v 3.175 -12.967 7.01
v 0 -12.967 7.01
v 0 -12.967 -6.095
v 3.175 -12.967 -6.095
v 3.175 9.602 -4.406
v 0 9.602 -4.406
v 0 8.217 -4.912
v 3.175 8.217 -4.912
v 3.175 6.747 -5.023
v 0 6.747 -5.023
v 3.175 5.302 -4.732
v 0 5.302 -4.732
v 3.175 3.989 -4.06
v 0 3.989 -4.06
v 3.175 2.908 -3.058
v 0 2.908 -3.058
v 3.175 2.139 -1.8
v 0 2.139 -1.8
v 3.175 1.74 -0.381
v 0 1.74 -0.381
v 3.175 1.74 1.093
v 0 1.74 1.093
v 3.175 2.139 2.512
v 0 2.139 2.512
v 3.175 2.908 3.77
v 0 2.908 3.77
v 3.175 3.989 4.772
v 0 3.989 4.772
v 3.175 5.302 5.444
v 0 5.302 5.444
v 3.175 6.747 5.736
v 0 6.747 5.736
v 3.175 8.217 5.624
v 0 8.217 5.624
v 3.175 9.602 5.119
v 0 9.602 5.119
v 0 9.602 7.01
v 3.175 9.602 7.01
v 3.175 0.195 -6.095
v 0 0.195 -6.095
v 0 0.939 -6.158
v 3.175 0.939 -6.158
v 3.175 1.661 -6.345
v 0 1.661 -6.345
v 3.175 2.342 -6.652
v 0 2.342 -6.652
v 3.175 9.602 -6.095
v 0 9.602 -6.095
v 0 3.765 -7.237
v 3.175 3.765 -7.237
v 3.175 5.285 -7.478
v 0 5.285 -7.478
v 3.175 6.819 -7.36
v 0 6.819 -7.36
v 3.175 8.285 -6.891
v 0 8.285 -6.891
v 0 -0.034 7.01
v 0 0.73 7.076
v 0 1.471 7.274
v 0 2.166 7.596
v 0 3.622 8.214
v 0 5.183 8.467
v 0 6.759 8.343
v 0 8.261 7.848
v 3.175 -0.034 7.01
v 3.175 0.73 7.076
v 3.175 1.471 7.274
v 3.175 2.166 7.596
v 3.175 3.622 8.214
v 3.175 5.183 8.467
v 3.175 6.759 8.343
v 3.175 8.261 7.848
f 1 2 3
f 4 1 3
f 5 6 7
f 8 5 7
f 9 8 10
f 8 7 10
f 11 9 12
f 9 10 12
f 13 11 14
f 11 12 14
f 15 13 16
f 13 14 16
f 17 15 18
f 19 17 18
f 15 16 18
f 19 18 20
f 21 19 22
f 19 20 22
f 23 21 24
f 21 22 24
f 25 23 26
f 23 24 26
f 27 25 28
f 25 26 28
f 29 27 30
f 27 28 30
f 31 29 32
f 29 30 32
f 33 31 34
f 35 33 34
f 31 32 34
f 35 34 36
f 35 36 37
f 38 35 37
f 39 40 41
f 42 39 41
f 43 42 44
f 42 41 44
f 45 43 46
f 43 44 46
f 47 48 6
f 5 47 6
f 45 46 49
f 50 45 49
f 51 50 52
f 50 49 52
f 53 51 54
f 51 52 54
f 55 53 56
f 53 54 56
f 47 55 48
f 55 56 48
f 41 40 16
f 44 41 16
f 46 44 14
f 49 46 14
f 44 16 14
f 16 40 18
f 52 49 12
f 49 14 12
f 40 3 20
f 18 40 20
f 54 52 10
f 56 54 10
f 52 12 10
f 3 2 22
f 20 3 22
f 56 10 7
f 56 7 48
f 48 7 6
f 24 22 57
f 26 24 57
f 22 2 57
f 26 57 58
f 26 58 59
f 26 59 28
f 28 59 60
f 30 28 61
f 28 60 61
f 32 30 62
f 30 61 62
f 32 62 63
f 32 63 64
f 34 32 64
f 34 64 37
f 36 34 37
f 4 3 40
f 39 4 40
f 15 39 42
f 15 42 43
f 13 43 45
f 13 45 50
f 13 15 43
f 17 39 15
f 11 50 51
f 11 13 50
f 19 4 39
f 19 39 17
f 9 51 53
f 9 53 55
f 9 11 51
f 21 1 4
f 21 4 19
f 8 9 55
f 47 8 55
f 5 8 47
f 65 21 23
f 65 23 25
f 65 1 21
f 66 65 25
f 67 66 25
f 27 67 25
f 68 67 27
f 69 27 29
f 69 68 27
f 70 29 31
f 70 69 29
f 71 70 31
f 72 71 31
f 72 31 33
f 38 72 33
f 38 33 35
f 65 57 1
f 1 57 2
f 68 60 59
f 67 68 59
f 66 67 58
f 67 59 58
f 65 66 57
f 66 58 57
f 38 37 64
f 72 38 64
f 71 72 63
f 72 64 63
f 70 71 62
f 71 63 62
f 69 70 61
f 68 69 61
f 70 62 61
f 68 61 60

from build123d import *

# Parameters (mm, degrees)
F1_DEPTH = 3.175


# Not quite as in the source:
# - a feature names something its author has since deleted; it is built from what else it names


with BuildPart() as f1:
    # F0 (on Right) → F1 (new body)
    with BuildSketch(Plane.YZ):
        with BuildLine():
            Line((-0.0335522907, 7.0097496485), (-12.9674749849, 7.0097496485))
            Line((-12.9674749849, 7.0097496485), (-12.9674749849, -6.0952282245))
            Line((-12.9674749849, -6.0952282245), (0.1951931324, -6.0952282245))
            ThreePointArc((0.1951931324, -6.0952282245), (1.3039147966, -6.2365574954), (2.3417274082, -6.651506498))
            ThreePointArc((2.3417274082, -6.651506498), (6.055282807, -7.4637663122), (9.6017406465, -6.0952282245))
            Line((9.6017406465, -6.0952282245), (9.6017406465, -4.4064043338))
            ThreePointArc((9.6017406465, -4.4064043338), (1.6888526066, 0.3560956662), (9.6017406465, 5.1185956662))
            Line((9.6017406465, 5.1185956662), (9.6017406465, 7.0097496485))
            ThreePointArc((9.6017406465, 7.0097496485), (5.9747824086, 8.4525130692), (2.1664773001, 7.5962394284))
            ThreePointArc((2.1664773001, 7.5962394284), (1.1048786978, 7.158888427), (-0.0335522907, 7.0097496485))
        make_face()
    extrude(amount=F1_DEPTH)


solid = f1.part
